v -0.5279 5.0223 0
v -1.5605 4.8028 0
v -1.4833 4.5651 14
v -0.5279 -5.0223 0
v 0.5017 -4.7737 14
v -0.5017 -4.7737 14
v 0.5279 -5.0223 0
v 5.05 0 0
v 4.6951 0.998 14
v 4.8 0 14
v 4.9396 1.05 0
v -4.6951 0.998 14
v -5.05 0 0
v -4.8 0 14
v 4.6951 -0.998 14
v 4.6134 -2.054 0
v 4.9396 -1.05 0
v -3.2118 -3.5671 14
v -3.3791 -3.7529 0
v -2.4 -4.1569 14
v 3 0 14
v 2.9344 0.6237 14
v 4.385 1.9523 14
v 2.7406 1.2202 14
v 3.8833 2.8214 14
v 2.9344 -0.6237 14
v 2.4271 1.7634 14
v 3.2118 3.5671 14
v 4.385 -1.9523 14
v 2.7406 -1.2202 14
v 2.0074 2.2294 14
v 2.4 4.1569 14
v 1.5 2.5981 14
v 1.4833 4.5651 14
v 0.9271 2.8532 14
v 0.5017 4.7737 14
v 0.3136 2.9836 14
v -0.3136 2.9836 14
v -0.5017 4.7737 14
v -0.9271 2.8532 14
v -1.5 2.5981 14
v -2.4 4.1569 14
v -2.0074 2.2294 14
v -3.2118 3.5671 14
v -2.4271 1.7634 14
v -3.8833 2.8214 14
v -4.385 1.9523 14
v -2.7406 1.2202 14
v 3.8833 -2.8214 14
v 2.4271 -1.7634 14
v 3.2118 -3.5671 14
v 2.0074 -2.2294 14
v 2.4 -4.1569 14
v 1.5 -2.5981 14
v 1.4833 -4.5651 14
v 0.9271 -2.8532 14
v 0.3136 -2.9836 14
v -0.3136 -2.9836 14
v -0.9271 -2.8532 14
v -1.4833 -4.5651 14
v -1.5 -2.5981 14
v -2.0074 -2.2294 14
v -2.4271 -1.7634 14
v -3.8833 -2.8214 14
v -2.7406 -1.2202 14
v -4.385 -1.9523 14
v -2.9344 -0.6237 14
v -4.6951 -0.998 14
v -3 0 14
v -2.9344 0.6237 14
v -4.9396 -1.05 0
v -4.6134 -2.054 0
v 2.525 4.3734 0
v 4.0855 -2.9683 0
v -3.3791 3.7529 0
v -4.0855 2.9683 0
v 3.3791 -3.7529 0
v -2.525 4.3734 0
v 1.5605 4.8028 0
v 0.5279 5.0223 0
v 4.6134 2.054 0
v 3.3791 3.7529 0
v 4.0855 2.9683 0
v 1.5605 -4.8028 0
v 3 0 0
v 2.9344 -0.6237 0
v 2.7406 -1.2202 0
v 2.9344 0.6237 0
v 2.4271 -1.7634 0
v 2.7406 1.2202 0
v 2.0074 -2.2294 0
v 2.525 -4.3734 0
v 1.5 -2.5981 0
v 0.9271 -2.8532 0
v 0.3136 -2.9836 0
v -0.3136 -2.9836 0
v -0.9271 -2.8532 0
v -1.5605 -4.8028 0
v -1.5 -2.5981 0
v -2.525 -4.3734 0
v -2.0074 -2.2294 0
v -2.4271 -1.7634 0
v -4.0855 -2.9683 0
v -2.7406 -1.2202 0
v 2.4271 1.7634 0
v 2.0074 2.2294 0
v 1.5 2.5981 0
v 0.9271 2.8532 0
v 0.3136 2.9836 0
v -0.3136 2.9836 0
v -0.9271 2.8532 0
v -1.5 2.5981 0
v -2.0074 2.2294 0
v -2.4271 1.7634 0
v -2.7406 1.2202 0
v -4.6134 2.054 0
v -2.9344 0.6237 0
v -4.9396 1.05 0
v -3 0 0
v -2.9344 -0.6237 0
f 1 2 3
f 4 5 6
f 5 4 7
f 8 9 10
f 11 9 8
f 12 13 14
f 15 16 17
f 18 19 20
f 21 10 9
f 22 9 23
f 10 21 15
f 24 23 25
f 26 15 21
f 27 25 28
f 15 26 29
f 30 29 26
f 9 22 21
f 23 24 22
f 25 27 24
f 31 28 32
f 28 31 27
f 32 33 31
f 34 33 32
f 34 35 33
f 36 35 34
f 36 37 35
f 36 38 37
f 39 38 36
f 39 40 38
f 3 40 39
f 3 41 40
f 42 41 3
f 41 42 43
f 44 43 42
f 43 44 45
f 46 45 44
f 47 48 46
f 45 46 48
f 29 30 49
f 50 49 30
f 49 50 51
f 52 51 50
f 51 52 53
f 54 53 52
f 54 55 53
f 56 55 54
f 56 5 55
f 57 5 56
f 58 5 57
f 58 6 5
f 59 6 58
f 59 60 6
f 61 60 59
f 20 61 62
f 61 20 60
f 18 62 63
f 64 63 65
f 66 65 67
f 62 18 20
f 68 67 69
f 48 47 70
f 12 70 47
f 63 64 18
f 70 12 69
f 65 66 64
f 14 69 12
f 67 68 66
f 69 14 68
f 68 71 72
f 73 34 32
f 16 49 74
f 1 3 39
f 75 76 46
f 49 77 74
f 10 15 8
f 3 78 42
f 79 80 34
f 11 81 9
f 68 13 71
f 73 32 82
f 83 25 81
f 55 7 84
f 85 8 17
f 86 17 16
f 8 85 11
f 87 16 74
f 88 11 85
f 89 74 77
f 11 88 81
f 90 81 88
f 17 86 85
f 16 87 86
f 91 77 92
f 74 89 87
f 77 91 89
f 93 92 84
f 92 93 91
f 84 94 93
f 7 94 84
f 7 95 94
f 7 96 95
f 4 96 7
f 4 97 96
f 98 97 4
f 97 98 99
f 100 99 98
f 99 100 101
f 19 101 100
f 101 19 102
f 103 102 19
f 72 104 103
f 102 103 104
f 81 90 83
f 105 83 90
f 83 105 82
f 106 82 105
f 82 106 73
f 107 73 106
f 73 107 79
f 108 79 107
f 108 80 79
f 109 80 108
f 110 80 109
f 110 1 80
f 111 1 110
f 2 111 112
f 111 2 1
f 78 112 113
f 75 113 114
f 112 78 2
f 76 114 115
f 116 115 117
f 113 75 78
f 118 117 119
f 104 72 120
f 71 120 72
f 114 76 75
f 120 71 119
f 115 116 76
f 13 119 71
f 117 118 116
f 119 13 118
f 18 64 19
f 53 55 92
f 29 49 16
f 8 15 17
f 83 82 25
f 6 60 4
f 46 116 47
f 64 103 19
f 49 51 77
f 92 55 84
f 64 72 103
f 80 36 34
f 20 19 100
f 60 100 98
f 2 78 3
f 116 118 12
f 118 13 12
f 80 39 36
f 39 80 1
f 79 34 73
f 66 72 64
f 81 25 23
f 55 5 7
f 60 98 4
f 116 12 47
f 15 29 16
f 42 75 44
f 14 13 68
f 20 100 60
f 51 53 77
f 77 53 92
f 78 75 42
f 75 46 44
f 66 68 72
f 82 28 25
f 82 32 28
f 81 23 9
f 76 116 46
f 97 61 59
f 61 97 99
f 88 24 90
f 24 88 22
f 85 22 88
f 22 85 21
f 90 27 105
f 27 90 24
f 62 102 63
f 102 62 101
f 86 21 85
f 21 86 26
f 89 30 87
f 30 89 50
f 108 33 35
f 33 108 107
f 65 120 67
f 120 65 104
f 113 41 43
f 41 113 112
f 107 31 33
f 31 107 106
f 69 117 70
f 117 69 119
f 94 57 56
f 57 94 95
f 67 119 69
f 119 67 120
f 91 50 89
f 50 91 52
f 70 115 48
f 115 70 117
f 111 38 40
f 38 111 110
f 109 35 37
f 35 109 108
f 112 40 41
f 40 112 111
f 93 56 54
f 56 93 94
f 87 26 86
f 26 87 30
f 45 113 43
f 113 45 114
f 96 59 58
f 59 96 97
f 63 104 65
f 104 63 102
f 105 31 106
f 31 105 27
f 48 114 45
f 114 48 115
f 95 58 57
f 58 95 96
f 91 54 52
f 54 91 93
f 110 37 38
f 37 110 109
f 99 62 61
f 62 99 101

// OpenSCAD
// Create a boss for retaining a bolt.
module bolt_boss_male(bolt_diameter = 3,
                      height = 14,
                      existing_case_thickness = 3,
                      // Wall thickness for bosses should be 0.6 to minimise sinking, but can be increased in non-visible
                      // areas for extra strength.
                      boss_wall_thickness_factor = 0.6,
                      // Is this boss intended for a self-tapping screw? (Hole will be reduced 70% if true).
                      self_tapping = false) {
   epsilon = 0.01;

   if(height >= (5 * existing_case_thickness)) {
      echo("Warning: Bolt boss height should not exceed 5 x existing case thickness.");
   }

   // Allow for self-tapping if required
   bolt_hole_diameter = (self_tapping == true) ? 0.7 * bolt_diameter : bolt_diameter;

   outer_radius = bolt_hole_diameter + (existing_case_thickness * boss_wall_thickness_factor);
   difference() {
      // Outer
      cylinder(h = height, r1 = outer_radius + 0.25, r2 = outer_radius);
      // Inner
      translate([0,0,-(epsilon/2)])
      cylinder(h = height + epsilon, r = bolt_hole_diameter);
   }
}

// Test code
$fs = 0.15;
bolt_boss_male();
